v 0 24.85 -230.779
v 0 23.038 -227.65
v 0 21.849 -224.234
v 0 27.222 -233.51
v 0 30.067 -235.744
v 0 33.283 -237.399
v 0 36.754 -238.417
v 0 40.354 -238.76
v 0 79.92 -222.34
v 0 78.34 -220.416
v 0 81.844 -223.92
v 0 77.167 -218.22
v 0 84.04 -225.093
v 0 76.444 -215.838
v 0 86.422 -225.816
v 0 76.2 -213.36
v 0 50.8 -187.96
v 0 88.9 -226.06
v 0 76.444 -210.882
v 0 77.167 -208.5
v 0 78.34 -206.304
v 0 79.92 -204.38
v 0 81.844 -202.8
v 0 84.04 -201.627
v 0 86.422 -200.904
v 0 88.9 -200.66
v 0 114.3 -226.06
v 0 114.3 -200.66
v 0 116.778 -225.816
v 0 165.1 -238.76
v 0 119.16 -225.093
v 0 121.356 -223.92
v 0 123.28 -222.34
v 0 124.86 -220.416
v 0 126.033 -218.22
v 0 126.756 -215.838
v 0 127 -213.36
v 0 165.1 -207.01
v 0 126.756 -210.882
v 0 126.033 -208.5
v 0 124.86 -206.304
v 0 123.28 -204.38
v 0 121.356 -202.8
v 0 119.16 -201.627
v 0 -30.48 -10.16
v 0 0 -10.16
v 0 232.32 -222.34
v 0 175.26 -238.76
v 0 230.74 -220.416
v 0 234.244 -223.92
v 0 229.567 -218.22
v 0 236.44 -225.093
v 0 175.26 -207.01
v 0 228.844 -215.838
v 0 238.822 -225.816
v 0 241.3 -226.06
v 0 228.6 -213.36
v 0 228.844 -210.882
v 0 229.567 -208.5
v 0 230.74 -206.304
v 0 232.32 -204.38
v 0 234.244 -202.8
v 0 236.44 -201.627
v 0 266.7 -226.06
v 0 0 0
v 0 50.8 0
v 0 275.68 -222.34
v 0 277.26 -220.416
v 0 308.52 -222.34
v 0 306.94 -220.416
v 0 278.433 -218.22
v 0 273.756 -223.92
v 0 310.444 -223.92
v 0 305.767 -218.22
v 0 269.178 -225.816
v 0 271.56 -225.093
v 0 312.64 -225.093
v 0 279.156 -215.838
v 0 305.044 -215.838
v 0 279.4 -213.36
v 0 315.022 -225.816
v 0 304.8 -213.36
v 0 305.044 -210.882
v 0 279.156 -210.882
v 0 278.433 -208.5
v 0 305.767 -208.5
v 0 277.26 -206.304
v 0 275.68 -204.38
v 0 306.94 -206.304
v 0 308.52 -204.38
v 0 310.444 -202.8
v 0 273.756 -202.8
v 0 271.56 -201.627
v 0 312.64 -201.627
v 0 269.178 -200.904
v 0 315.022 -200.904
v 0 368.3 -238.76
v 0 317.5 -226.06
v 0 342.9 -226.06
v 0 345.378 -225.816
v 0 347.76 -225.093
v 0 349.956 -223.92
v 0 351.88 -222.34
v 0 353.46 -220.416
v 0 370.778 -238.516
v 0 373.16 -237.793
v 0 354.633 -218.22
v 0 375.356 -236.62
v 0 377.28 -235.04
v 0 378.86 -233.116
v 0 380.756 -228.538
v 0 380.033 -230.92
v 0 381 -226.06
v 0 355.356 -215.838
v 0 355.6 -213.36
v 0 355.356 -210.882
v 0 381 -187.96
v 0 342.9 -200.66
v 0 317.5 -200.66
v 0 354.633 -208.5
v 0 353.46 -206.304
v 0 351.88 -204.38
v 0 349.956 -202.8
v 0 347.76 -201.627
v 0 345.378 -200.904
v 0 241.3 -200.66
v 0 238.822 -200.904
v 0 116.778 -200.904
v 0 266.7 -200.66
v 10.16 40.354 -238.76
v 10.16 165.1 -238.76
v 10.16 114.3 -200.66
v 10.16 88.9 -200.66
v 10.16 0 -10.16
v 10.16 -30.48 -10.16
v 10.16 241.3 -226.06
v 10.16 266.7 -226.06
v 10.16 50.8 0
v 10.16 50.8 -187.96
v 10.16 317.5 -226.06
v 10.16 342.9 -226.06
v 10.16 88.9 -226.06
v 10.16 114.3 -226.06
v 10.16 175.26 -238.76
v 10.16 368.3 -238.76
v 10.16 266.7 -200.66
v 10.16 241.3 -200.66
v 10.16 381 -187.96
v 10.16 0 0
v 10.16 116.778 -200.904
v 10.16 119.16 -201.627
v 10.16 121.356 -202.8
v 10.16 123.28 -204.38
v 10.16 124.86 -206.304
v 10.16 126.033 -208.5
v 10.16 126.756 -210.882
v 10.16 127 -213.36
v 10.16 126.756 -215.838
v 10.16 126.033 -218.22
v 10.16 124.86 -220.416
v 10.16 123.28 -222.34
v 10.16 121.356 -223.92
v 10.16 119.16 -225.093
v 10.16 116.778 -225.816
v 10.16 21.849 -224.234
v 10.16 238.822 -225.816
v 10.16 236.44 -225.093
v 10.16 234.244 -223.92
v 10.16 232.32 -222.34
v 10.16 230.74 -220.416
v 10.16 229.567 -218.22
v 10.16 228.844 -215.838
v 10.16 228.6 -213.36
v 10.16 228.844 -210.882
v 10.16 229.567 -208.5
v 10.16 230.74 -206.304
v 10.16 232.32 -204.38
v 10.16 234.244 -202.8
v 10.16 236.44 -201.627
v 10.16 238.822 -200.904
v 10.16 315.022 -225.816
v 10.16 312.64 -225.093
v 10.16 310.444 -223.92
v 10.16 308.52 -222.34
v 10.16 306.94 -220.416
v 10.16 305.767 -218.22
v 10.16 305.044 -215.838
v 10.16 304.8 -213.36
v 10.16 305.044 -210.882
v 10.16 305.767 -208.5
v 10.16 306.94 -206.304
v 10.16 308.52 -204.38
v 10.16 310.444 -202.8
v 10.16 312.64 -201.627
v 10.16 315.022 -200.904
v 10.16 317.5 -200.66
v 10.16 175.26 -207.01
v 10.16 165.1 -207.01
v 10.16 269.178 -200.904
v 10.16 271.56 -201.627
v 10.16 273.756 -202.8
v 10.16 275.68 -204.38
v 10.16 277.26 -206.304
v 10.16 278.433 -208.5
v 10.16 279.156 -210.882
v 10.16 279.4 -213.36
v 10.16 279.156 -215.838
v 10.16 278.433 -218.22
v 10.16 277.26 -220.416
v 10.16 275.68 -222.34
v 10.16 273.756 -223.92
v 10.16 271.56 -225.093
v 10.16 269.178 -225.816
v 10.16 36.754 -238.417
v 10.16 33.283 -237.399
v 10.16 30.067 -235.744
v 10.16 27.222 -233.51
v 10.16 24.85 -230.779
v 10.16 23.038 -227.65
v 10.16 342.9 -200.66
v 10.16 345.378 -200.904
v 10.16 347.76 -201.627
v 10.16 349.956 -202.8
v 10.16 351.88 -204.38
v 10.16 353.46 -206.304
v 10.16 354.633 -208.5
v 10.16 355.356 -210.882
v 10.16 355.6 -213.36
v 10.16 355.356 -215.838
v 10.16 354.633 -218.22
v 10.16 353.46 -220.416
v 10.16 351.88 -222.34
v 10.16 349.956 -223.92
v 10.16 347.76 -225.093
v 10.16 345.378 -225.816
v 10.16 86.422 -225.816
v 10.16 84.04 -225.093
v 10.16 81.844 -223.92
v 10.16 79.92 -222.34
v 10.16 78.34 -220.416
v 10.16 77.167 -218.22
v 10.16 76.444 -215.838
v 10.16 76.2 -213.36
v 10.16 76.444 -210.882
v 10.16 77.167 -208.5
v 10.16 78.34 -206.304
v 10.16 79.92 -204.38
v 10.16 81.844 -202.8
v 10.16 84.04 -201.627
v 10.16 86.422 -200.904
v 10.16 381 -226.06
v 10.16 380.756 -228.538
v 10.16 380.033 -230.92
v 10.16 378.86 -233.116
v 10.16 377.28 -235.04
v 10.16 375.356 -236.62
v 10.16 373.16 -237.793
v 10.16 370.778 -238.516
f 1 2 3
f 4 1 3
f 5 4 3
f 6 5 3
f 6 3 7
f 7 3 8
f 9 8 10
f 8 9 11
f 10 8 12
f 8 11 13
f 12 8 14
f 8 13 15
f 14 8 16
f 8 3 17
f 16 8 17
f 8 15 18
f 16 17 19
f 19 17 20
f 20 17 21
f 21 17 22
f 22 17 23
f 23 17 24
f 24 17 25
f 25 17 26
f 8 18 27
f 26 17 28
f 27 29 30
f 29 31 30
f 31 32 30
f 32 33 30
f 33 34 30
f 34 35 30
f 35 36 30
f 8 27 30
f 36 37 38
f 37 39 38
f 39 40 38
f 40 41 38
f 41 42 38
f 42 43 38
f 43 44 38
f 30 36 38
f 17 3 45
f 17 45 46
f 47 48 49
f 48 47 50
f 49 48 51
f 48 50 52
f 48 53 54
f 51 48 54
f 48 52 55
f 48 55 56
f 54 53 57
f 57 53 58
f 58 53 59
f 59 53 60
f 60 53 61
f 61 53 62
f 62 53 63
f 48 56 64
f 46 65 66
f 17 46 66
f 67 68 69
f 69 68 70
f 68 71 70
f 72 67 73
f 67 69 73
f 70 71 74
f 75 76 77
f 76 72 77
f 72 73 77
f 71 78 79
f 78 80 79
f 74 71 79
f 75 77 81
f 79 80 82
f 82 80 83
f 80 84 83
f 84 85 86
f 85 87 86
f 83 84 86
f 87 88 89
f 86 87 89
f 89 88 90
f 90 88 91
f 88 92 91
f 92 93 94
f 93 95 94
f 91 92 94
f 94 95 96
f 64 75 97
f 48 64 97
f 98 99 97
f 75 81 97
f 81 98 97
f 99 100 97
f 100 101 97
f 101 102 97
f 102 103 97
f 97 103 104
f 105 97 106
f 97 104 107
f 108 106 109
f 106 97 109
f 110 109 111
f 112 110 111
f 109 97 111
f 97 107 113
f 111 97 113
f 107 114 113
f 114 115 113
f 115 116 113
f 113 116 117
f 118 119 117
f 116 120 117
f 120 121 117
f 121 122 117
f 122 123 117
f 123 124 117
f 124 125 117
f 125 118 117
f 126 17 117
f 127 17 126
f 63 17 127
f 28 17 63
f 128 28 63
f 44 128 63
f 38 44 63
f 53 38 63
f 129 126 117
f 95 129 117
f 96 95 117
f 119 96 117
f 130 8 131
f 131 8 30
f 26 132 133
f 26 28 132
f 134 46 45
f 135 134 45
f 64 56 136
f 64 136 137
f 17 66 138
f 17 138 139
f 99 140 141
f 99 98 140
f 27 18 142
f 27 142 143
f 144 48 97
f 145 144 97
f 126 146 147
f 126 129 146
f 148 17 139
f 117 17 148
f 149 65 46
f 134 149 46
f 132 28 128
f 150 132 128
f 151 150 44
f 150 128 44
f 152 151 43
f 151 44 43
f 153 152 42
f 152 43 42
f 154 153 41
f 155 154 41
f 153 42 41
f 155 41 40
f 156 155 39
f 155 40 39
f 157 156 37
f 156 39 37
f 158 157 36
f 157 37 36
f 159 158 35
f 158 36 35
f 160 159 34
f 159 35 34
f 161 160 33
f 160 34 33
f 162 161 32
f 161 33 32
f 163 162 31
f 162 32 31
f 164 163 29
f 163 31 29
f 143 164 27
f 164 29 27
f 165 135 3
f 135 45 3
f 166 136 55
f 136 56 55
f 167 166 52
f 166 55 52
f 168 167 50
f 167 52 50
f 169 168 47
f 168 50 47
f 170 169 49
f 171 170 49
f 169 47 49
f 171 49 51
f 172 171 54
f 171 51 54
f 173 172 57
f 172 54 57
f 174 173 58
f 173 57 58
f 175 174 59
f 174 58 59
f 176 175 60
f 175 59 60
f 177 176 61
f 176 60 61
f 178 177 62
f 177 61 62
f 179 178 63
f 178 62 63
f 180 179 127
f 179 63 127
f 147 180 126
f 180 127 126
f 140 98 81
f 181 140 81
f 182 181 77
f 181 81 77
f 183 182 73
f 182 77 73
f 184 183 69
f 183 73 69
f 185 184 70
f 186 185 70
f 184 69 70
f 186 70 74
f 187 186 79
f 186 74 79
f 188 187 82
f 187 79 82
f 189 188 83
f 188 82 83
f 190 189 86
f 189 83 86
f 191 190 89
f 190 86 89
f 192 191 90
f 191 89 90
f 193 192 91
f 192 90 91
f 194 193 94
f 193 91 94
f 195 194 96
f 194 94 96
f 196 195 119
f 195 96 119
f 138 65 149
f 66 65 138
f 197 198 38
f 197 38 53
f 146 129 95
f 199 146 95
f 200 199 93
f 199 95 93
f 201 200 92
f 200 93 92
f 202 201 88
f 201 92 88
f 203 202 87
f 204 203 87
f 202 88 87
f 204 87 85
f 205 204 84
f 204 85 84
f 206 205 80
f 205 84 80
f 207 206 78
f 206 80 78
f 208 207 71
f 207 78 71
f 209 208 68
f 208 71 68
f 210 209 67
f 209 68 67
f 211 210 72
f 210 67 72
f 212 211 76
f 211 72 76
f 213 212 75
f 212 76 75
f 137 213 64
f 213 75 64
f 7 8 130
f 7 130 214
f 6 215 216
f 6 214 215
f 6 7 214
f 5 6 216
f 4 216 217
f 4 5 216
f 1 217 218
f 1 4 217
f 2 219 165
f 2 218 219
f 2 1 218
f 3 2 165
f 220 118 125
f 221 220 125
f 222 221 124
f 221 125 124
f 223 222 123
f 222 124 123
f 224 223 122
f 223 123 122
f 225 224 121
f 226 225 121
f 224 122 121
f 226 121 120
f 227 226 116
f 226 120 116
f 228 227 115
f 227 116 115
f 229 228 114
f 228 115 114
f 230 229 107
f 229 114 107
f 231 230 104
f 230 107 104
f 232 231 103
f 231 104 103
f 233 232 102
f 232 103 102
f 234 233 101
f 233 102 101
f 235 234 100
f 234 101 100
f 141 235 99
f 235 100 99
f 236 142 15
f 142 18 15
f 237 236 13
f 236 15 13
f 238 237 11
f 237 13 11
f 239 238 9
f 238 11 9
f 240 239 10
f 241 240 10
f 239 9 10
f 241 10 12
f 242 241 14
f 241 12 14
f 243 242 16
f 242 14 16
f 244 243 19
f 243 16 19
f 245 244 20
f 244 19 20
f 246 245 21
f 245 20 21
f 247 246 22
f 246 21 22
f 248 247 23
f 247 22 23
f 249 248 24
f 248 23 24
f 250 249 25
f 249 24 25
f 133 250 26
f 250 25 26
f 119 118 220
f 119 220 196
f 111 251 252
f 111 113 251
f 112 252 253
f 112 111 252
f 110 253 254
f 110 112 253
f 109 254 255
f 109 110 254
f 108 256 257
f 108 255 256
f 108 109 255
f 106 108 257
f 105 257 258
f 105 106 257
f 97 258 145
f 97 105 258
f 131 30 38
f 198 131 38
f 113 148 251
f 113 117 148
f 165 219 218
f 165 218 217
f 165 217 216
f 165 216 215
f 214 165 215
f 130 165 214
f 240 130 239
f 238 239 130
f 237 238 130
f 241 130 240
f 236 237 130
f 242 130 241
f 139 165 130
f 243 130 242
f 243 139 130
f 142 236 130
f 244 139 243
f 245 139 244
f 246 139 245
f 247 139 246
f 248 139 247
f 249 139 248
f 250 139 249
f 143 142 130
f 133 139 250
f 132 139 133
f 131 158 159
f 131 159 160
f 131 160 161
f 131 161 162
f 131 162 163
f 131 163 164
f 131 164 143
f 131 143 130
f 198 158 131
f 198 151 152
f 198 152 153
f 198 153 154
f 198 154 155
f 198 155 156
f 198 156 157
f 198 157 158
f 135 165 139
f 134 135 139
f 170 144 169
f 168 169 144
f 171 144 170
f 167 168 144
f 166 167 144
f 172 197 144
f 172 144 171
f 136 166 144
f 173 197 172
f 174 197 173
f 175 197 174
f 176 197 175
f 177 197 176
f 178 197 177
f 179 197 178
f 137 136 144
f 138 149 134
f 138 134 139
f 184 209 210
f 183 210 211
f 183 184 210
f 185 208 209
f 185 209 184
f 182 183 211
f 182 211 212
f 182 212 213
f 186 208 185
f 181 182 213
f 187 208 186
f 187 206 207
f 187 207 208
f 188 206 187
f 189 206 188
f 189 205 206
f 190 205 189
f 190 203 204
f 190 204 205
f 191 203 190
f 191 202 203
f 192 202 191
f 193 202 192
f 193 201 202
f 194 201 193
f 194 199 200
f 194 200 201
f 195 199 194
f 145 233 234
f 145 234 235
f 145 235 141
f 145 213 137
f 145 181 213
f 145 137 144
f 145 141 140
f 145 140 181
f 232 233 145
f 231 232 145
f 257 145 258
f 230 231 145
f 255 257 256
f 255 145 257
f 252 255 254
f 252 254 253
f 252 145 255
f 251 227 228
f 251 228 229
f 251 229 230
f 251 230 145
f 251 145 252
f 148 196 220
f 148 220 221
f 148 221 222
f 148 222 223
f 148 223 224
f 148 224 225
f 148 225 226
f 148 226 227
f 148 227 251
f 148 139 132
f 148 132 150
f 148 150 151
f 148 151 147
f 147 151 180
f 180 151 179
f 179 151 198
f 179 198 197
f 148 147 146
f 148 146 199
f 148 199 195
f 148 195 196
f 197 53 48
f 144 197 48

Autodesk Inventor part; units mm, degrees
ref_plane "YZ Plane" through (0, 0, 0) normal (1, 0, 0) x (0, 1, 0)
ref_plane "XZ Plane" through (0, 0, 0) normal (0, 1, 0) x (-1, 0, 0)
ref_plane "XY Plane" through (0, 0, 0) normal (0, 0, 1) x (1, 0, 0)
sketch "Sketch1" plane through (0, 0, 0) normal (1, 0, 0) x (0, 1, 0)
  line L0 (0, 0) -> (50.8, 0)
  line L1 (50.8, 0) -> (50.8, -187.96)
  line L2 (50.8, -187.96) -> (381, -187.96)
  line L3 (381, -187.96) -> (381, -226.06)
  line L4 (0, 0) -> (0, -10.16)
  line L5 (0, -10.16) -> (-30.48, -10.16)
  line L6 (-30.48, -10.16) -> (21.8491, -224.2335)
  line L7 (40.3542, -238.76) -> (368.3, -238.76)
  line L8 (342.9, -200.66) -> (317.5, -200.66)
  line L9 (304.8, -213.36) -> (304.8, -213.36)
  line L10 (317.5, -226.06) -> (342.9, -226.06)
  line L11 (355.6, -213.36) -> (355.6, -213.36)
  line L12 (266.7, -200.66) -> (241.3, -200.66)
  line L13 (228.6, -213.36) -> (228.6, -213.36)
  line L14 (241.3, -226.06) -> (266.7, -226.06)
  line L15 (279.4, -213.36) -> (279.4, -213.36)
  line L16 (152.4, -213.36) -> (152.4, -213.36)
  line L17 (203.2, -213.36) -> (203.2, -213.36)
  line L18 (114.3, -200.66) -> (88.9, -200.66)
  line L19 (76.2, -213.36) -> (76.2, -213.36)
  line L20 (88.9, -226.06) -> (114.3, -226.06)
  line L21 (127, -213.36) -> (127, -213.36)
  line L22 (127, -226.06) -> (152.4, -226.06)
  line L23 (203.2, -226.06) -> (228.6, -226.06)
  line L24 (279.4, -226.06) -> (304.8, -226.06)
  line L25 (355.6, -226.06) -> (381, -226.06)
  line L26 (355.6, -226.06) -> (355.6, -238.76)
  arc A0 (355.6, -213.36) -> (342.9, -200.66) centre (342.9, -213.36) ccw
  arc A1 (342.9, -226.06) -> (355.6, -213.36) centre (342.9, -213.36) ccw
  arc A2 (317.5, -200.66) -> (304.8, -213.36) centre (317.5, -213.36) ccw
  arc A3 (304.8, -213.36) -> (317.5, -226.06) centre (317.5, -213.36) ccw
  arc A4 (279.4, -213.36) -> (266.7, -200.66) centre (266.7, -213.36) ccw
  arc A5 (266.7, -226.06) -> (279.4, -213.36) centre (266.7, -213.36) ccw
  arc A6 (241.3, -200.66) -> (228.6, -213.36) centre (241.3, -213.36) ccw
  arc A7 (228.6, -213.36) -> (241.3, -226.06) centre (241.3, -213.36) ccw
  arc A8 (127, -213.36) -> (114.3, -200.66) centre (114.3, -213.36) ccw
  arc A9 (88.9, -200.66) -> (76.2, -213.36) centre (88.9, -213.36) ccw
  arc A10 (76.2, -213.36) -> (88.9, -226.06) centre (88.9, -213.36) ccw
  arc A11 (114.3, -226.06) -> (127, -213.36) centre (114.3, -213.36) ccw
  arc A12 (21.8491, -224.2335) -> (40.3542, -238.76) centre (40.3542, -219.71) ccw
  arc A13 (368.3, -238.76) -> (381, -226.06) centre (368.3, -226.06) ccw
  line L27 (165.1, -238.76) -> (165.1, -207.01)
  line L28 (165.1, -207.01) -> (175.26, -207.01)
  line L29 (175.26, -207.01) -> (175.26, -238.76)
  point P0 (381, -238.76)
  point P1 (355.6, -200.66)
  point P2 (279.4, -200.66)
  point P3 (203.2, -200.66)
  point P4 (127, -200.66)
  point P5 (76.2, -226.06)
  point P6 (127, -213.36)
  point P7 (76.2, -213.36)
  point P8 (228.6, -213.36)
  point P9 (355.6, -213.36)
  point P10 (304.8, -213.36)
  dimension "d0" = 50.8
  dimension "d1" = 187.96
  dimension "d2" = 330.2
  dimension "d3" = 50.8
  dimension "d5" = 10.16
  dimension "d6" = 30.48
  dimension "d10" = 50.8
  dimension "d11" = 25.4
  dimension "d12" = 25.4
  dimension "d13" = 12.7
  dimension "d14" = 12.7
  dimension "d15" = 50.8
  dimension "d16" = 50.8
  dimension "d17" = 50.8
  dimension "d18" = 12.7
  dimension "d19" = 19.05
  dimension "d22" = 12.7
  dimension "d24" = 12.7
  dimension "d25" = 10.16
  dimension "d26" = 31.75
  dimension "d27" = 114.3
  dimension "d28" = 196.85
extrude "Extrusion1" add sketch "Sketch1" along normal blind 10.16 contours L0 L1 L2 L3 L25 L26 L7 L29 L28 L27 A12 L6 L5 L4 | A13 L7 L26 L25
properties part number "battery front brace"
